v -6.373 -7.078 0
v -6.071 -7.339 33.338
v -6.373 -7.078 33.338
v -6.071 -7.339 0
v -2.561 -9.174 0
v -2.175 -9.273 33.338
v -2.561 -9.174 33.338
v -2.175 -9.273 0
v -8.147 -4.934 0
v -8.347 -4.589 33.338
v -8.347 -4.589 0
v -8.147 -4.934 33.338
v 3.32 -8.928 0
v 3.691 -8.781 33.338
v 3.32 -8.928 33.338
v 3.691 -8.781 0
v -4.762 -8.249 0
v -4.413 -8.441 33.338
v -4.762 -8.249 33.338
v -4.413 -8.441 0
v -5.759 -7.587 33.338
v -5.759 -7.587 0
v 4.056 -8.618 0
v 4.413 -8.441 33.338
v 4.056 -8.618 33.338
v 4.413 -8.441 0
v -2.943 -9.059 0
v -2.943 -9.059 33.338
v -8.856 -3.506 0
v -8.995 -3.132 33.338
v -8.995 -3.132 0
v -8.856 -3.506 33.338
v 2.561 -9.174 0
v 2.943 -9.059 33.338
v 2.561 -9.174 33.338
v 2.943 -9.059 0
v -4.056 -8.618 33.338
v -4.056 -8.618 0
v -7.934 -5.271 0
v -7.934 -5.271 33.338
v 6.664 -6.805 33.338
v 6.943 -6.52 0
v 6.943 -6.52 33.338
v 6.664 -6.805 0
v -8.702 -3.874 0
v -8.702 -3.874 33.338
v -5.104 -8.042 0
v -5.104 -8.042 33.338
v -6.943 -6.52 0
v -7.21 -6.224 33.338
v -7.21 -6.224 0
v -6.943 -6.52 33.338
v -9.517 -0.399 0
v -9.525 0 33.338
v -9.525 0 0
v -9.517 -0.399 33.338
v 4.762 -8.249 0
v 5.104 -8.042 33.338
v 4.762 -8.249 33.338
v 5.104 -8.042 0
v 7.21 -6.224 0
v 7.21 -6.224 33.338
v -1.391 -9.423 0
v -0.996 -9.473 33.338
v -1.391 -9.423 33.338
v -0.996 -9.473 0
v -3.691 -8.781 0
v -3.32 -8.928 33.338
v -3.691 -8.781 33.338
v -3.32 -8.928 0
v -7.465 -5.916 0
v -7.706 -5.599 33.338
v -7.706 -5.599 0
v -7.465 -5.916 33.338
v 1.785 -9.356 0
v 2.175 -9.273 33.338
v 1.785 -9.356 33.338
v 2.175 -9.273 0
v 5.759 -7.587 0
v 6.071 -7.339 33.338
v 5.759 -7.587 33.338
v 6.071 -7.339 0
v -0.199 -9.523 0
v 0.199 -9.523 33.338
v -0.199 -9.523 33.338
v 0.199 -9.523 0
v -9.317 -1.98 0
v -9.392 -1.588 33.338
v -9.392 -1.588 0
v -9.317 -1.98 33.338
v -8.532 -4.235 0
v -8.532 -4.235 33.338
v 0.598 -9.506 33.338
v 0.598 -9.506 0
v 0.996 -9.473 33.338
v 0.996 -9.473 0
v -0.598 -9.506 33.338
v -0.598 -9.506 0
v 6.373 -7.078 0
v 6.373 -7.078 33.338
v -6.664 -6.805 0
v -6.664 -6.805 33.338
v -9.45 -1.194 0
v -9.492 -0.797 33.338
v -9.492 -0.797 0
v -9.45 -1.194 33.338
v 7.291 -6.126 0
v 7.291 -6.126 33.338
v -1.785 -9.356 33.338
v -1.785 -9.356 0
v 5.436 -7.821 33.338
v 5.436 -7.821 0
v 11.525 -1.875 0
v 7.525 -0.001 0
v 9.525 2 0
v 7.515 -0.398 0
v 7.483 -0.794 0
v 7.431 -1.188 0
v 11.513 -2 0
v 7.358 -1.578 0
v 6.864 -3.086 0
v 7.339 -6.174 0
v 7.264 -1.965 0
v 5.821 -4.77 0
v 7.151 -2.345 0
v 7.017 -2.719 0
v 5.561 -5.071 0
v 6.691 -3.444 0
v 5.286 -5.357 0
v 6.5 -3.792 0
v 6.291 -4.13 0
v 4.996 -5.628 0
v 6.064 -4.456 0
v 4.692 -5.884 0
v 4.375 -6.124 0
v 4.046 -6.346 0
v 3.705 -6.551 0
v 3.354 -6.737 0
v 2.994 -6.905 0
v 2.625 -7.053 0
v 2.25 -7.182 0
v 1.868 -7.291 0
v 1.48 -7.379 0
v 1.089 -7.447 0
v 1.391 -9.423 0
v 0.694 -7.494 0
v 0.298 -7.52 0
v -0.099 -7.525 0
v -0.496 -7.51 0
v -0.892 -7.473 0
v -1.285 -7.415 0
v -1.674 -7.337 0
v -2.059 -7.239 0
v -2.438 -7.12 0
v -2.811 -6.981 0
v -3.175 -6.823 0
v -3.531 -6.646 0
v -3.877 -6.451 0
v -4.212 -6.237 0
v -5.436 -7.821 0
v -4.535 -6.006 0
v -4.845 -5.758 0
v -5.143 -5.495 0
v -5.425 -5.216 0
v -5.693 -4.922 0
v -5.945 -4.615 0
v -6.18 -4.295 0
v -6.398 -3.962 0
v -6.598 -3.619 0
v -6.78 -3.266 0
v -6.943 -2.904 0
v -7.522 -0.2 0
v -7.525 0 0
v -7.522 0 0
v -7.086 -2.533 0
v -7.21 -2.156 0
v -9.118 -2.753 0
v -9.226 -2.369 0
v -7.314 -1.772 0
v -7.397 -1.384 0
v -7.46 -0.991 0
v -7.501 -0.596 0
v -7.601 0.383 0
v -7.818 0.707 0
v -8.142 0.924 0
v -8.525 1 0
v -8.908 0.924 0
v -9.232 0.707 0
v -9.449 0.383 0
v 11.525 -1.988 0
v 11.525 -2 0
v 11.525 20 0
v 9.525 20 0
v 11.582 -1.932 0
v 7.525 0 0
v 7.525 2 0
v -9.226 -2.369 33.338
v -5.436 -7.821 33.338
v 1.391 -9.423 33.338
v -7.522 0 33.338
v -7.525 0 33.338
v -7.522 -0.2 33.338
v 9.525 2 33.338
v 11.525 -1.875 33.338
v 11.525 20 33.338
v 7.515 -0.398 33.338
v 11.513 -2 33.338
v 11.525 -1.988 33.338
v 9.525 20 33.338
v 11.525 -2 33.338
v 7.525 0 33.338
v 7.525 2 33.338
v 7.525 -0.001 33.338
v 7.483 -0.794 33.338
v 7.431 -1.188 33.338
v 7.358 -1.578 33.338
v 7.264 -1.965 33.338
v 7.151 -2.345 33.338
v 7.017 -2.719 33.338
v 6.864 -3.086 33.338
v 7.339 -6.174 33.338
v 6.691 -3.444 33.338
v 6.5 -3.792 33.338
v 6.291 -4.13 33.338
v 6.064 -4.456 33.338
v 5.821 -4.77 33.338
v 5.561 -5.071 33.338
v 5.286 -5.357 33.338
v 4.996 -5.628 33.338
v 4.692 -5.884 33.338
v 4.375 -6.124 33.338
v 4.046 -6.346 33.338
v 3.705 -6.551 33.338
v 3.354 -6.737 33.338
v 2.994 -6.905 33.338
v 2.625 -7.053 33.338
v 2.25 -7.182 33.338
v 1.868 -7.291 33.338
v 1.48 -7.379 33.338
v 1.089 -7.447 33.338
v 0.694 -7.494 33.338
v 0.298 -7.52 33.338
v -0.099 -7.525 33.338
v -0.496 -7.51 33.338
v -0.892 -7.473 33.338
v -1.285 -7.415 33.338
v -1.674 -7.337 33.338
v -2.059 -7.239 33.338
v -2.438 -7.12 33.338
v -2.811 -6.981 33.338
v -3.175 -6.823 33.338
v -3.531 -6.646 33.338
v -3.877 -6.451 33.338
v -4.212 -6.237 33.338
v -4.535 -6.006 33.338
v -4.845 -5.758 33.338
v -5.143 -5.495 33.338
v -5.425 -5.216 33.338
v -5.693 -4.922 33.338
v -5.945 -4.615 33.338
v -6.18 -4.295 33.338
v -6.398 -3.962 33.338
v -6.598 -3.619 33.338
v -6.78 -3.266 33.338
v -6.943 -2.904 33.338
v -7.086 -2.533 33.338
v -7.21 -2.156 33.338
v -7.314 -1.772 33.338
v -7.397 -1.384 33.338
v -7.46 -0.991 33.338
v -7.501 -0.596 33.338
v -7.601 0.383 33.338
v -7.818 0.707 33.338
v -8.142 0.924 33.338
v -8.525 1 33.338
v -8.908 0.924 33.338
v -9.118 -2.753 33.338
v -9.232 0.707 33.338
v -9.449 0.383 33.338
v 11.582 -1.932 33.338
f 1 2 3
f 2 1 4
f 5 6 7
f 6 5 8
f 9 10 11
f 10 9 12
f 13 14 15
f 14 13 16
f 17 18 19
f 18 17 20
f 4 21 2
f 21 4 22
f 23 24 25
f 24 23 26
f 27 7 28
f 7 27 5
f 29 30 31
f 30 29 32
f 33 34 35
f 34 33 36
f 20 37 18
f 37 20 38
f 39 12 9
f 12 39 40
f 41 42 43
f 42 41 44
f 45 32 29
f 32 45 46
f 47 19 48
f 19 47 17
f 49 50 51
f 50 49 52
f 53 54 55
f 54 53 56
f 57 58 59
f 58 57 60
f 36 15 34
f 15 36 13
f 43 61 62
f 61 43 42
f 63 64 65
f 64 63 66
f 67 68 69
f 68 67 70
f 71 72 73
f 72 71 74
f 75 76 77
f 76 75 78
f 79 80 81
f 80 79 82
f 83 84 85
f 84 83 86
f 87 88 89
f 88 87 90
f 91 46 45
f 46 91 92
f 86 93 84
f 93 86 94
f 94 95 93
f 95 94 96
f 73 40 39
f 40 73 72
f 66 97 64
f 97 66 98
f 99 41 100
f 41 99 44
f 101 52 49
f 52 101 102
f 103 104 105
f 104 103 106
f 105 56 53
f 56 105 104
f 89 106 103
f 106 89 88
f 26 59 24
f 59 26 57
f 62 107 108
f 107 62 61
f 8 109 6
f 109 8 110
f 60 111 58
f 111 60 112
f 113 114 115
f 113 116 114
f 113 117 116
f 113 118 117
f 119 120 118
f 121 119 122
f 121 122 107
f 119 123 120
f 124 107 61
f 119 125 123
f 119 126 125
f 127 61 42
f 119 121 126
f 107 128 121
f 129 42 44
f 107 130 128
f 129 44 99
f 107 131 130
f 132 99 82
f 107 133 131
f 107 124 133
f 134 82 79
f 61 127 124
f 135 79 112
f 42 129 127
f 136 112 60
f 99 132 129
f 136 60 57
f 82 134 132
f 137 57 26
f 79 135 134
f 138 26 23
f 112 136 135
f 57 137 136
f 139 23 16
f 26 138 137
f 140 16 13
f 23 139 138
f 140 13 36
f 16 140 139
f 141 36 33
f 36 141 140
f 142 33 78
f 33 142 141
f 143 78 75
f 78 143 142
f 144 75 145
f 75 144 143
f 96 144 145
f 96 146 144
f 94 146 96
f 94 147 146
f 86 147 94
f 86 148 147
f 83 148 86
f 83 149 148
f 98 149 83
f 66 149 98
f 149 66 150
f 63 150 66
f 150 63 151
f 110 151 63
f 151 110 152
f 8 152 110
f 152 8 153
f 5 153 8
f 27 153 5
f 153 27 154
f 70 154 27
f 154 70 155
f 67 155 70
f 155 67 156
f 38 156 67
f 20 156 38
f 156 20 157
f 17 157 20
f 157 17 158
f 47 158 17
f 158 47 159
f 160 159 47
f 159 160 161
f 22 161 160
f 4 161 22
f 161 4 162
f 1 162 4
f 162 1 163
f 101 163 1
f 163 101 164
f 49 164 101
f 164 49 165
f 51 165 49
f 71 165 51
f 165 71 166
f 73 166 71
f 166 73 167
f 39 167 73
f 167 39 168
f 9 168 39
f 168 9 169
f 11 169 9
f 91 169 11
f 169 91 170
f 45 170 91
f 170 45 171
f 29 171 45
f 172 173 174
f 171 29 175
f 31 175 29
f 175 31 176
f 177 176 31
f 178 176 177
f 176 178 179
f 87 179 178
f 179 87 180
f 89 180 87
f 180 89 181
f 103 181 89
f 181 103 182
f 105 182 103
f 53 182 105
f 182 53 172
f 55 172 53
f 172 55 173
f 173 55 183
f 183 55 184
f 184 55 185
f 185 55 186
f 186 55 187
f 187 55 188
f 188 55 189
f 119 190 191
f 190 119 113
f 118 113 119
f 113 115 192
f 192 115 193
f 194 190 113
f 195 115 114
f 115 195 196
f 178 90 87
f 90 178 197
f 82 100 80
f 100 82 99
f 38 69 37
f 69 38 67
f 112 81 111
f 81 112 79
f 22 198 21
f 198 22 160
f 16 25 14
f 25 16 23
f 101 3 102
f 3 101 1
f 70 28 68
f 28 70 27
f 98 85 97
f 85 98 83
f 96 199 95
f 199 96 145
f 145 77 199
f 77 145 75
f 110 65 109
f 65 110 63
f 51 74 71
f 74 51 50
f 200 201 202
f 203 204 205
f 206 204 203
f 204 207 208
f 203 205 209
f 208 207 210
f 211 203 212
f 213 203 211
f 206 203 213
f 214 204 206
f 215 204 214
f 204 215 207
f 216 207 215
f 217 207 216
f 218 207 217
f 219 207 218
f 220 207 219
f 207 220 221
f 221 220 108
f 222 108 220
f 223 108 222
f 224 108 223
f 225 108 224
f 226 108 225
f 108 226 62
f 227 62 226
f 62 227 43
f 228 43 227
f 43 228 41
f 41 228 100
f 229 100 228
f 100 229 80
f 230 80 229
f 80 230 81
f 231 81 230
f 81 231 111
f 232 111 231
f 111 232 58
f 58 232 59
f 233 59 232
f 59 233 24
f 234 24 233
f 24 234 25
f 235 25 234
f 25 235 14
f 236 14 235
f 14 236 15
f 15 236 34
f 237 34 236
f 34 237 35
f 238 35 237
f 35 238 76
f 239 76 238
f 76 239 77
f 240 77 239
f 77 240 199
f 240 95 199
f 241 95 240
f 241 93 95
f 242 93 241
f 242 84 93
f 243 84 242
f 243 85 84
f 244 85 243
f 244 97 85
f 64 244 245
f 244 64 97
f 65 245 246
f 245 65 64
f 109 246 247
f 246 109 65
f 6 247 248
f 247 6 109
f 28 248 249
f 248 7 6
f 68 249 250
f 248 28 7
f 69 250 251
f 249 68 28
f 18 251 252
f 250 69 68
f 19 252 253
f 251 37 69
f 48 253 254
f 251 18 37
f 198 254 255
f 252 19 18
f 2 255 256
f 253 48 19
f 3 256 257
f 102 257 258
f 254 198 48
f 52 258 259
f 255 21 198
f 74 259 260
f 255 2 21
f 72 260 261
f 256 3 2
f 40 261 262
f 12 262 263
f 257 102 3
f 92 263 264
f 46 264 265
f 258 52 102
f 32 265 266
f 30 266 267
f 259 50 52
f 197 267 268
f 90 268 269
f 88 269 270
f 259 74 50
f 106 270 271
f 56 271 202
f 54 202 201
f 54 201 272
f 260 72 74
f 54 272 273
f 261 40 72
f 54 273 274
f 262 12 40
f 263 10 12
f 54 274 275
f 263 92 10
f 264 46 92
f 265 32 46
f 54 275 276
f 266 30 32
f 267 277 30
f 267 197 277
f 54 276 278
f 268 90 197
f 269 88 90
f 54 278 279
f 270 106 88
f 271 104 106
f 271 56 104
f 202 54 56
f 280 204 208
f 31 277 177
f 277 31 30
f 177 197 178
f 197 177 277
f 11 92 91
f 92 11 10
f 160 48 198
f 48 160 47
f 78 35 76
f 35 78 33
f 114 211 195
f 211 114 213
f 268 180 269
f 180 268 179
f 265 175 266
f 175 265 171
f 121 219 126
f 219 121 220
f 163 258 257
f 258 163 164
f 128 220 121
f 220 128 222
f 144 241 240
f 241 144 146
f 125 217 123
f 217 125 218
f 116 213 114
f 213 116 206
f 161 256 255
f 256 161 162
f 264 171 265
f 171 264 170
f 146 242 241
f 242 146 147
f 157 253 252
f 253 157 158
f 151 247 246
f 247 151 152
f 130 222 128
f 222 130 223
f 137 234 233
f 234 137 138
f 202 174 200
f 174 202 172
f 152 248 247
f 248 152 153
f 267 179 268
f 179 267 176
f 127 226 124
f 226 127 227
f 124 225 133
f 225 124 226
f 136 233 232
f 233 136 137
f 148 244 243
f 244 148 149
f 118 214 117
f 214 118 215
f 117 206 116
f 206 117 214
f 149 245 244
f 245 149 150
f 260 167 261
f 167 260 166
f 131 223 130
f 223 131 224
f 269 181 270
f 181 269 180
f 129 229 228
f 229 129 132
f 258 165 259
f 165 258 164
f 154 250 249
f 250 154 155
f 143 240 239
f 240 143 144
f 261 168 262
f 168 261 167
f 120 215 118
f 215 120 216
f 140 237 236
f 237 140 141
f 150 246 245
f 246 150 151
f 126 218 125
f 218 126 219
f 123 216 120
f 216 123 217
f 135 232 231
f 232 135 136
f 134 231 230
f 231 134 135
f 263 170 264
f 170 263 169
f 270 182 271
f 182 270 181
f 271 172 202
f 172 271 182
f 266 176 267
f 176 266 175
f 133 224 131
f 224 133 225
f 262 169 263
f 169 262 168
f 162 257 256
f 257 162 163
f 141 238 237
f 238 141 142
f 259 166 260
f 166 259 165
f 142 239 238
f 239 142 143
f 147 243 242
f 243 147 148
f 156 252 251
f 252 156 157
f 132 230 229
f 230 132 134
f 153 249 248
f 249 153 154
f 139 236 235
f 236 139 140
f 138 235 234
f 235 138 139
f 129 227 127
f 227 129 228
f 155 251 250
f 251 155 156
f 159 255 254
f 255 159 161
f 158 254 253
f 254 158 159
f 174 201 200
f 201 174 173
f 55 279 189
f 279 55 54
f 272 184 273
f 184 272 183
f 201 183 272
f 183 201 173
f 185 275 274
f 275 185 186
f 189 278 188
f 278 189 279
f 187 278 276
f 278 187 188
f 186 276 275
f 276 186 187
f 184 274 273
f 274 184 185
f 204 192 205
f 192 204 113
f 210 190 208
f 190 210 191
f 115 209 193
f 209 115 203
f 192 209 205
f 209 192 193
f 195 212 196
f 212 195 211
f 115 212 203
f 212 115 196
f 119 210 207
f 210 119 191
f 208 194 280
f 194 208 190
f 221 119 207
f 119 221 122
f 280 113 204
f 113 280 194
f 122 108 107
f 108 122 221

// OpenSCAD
use <mylib.scad>;

p = .001;
pp = 2 * p;
t0 = 2;
inch = 25.4;

ch = 21/16 * inch; // clip height
cr = 3/8 * inch; // clip radius
wx = 5/8 * inch;


module wing() {
  p0x = cr;
  p0y = 3;
  wa1 = 30;
  p1x = p0x - 14;
  p1y = p0y + wx * sin(wa1);
  p2x = p1x;
  p2y = p1y + 10;
  d3r = 11.5;
  d3xy = d3r * sin(45); // d3x = sin(45), d3y = cos(45)
  p3m = 1 * sin(45);  // a short delta down 45
  ka = 45;
  kx = 2 * sin(ka);   // a short delta up at 45 for fillet
  ky = 2 * cos(ka);
  p3x = p2x + d3xy;
  p3y = p2y + d3xy;
  p4x = p0x;
  p4y = p2y+ 2;
  pts = [
    [p0x, p0y], 
    [p1x, p1y], 
    [p2x, p2y], 
    [p3x-p3m, p3y-p3m], 
    [p3x - kx, p3y + ky], 
    [p3x, p3y], 
    [p4x, p4y]];
  sr = 4 ;
  cco = sr;
  cxy = cco * sin(45);
  linear_extrude(height = t0) 
  {
    polygon(pts);
    trr([p3x-cxy-cxy*.5, p3y-cxy+.5*cxy , 0]) 
    difference() {
      circle(r = sr);
      circle(r = sr-t0);
      trr([-sr*.707/2, -sr*.707/2, 0, [0, 0, 45]]) square([sr, sr], true);
  }
  } 
}

trr([t0/2-cr, 0, 0]) cylinder(h = ch, r = t0/2);

difference() {
  trr([0, 0, ch/2]) cylinder(h = ch, r = cr, center = true);
  trr([0, -p, ch/2]) cylinder(h = ch+pp, r = cr - t0, center = true);
  trr([-cr, 0 , -p, [0, 0, 0, [cr, 0 ,0]]]) cube([cr * 1.5, cr, ch+pp]);
  trr([0, 0, -p]) cube([cr, cl, ch+pp]);
}
cl = 20; // clip length
// trr([cr-t0, 0, 0]) cube([t0, cl, ch]);
// wing();
// trr([0, 0, ch-t0]) wing();

trr([cr, 0, 0]) cube([t0, cl, ch]);
trr([cr-t0, -t0, 0]) cube([2*t0, 2*t0, ch]);
trr([cr-1.8*t0, -2.38*t0, 0, [0, 0, -45]]) cube([t0, 3*t0, ch]);
